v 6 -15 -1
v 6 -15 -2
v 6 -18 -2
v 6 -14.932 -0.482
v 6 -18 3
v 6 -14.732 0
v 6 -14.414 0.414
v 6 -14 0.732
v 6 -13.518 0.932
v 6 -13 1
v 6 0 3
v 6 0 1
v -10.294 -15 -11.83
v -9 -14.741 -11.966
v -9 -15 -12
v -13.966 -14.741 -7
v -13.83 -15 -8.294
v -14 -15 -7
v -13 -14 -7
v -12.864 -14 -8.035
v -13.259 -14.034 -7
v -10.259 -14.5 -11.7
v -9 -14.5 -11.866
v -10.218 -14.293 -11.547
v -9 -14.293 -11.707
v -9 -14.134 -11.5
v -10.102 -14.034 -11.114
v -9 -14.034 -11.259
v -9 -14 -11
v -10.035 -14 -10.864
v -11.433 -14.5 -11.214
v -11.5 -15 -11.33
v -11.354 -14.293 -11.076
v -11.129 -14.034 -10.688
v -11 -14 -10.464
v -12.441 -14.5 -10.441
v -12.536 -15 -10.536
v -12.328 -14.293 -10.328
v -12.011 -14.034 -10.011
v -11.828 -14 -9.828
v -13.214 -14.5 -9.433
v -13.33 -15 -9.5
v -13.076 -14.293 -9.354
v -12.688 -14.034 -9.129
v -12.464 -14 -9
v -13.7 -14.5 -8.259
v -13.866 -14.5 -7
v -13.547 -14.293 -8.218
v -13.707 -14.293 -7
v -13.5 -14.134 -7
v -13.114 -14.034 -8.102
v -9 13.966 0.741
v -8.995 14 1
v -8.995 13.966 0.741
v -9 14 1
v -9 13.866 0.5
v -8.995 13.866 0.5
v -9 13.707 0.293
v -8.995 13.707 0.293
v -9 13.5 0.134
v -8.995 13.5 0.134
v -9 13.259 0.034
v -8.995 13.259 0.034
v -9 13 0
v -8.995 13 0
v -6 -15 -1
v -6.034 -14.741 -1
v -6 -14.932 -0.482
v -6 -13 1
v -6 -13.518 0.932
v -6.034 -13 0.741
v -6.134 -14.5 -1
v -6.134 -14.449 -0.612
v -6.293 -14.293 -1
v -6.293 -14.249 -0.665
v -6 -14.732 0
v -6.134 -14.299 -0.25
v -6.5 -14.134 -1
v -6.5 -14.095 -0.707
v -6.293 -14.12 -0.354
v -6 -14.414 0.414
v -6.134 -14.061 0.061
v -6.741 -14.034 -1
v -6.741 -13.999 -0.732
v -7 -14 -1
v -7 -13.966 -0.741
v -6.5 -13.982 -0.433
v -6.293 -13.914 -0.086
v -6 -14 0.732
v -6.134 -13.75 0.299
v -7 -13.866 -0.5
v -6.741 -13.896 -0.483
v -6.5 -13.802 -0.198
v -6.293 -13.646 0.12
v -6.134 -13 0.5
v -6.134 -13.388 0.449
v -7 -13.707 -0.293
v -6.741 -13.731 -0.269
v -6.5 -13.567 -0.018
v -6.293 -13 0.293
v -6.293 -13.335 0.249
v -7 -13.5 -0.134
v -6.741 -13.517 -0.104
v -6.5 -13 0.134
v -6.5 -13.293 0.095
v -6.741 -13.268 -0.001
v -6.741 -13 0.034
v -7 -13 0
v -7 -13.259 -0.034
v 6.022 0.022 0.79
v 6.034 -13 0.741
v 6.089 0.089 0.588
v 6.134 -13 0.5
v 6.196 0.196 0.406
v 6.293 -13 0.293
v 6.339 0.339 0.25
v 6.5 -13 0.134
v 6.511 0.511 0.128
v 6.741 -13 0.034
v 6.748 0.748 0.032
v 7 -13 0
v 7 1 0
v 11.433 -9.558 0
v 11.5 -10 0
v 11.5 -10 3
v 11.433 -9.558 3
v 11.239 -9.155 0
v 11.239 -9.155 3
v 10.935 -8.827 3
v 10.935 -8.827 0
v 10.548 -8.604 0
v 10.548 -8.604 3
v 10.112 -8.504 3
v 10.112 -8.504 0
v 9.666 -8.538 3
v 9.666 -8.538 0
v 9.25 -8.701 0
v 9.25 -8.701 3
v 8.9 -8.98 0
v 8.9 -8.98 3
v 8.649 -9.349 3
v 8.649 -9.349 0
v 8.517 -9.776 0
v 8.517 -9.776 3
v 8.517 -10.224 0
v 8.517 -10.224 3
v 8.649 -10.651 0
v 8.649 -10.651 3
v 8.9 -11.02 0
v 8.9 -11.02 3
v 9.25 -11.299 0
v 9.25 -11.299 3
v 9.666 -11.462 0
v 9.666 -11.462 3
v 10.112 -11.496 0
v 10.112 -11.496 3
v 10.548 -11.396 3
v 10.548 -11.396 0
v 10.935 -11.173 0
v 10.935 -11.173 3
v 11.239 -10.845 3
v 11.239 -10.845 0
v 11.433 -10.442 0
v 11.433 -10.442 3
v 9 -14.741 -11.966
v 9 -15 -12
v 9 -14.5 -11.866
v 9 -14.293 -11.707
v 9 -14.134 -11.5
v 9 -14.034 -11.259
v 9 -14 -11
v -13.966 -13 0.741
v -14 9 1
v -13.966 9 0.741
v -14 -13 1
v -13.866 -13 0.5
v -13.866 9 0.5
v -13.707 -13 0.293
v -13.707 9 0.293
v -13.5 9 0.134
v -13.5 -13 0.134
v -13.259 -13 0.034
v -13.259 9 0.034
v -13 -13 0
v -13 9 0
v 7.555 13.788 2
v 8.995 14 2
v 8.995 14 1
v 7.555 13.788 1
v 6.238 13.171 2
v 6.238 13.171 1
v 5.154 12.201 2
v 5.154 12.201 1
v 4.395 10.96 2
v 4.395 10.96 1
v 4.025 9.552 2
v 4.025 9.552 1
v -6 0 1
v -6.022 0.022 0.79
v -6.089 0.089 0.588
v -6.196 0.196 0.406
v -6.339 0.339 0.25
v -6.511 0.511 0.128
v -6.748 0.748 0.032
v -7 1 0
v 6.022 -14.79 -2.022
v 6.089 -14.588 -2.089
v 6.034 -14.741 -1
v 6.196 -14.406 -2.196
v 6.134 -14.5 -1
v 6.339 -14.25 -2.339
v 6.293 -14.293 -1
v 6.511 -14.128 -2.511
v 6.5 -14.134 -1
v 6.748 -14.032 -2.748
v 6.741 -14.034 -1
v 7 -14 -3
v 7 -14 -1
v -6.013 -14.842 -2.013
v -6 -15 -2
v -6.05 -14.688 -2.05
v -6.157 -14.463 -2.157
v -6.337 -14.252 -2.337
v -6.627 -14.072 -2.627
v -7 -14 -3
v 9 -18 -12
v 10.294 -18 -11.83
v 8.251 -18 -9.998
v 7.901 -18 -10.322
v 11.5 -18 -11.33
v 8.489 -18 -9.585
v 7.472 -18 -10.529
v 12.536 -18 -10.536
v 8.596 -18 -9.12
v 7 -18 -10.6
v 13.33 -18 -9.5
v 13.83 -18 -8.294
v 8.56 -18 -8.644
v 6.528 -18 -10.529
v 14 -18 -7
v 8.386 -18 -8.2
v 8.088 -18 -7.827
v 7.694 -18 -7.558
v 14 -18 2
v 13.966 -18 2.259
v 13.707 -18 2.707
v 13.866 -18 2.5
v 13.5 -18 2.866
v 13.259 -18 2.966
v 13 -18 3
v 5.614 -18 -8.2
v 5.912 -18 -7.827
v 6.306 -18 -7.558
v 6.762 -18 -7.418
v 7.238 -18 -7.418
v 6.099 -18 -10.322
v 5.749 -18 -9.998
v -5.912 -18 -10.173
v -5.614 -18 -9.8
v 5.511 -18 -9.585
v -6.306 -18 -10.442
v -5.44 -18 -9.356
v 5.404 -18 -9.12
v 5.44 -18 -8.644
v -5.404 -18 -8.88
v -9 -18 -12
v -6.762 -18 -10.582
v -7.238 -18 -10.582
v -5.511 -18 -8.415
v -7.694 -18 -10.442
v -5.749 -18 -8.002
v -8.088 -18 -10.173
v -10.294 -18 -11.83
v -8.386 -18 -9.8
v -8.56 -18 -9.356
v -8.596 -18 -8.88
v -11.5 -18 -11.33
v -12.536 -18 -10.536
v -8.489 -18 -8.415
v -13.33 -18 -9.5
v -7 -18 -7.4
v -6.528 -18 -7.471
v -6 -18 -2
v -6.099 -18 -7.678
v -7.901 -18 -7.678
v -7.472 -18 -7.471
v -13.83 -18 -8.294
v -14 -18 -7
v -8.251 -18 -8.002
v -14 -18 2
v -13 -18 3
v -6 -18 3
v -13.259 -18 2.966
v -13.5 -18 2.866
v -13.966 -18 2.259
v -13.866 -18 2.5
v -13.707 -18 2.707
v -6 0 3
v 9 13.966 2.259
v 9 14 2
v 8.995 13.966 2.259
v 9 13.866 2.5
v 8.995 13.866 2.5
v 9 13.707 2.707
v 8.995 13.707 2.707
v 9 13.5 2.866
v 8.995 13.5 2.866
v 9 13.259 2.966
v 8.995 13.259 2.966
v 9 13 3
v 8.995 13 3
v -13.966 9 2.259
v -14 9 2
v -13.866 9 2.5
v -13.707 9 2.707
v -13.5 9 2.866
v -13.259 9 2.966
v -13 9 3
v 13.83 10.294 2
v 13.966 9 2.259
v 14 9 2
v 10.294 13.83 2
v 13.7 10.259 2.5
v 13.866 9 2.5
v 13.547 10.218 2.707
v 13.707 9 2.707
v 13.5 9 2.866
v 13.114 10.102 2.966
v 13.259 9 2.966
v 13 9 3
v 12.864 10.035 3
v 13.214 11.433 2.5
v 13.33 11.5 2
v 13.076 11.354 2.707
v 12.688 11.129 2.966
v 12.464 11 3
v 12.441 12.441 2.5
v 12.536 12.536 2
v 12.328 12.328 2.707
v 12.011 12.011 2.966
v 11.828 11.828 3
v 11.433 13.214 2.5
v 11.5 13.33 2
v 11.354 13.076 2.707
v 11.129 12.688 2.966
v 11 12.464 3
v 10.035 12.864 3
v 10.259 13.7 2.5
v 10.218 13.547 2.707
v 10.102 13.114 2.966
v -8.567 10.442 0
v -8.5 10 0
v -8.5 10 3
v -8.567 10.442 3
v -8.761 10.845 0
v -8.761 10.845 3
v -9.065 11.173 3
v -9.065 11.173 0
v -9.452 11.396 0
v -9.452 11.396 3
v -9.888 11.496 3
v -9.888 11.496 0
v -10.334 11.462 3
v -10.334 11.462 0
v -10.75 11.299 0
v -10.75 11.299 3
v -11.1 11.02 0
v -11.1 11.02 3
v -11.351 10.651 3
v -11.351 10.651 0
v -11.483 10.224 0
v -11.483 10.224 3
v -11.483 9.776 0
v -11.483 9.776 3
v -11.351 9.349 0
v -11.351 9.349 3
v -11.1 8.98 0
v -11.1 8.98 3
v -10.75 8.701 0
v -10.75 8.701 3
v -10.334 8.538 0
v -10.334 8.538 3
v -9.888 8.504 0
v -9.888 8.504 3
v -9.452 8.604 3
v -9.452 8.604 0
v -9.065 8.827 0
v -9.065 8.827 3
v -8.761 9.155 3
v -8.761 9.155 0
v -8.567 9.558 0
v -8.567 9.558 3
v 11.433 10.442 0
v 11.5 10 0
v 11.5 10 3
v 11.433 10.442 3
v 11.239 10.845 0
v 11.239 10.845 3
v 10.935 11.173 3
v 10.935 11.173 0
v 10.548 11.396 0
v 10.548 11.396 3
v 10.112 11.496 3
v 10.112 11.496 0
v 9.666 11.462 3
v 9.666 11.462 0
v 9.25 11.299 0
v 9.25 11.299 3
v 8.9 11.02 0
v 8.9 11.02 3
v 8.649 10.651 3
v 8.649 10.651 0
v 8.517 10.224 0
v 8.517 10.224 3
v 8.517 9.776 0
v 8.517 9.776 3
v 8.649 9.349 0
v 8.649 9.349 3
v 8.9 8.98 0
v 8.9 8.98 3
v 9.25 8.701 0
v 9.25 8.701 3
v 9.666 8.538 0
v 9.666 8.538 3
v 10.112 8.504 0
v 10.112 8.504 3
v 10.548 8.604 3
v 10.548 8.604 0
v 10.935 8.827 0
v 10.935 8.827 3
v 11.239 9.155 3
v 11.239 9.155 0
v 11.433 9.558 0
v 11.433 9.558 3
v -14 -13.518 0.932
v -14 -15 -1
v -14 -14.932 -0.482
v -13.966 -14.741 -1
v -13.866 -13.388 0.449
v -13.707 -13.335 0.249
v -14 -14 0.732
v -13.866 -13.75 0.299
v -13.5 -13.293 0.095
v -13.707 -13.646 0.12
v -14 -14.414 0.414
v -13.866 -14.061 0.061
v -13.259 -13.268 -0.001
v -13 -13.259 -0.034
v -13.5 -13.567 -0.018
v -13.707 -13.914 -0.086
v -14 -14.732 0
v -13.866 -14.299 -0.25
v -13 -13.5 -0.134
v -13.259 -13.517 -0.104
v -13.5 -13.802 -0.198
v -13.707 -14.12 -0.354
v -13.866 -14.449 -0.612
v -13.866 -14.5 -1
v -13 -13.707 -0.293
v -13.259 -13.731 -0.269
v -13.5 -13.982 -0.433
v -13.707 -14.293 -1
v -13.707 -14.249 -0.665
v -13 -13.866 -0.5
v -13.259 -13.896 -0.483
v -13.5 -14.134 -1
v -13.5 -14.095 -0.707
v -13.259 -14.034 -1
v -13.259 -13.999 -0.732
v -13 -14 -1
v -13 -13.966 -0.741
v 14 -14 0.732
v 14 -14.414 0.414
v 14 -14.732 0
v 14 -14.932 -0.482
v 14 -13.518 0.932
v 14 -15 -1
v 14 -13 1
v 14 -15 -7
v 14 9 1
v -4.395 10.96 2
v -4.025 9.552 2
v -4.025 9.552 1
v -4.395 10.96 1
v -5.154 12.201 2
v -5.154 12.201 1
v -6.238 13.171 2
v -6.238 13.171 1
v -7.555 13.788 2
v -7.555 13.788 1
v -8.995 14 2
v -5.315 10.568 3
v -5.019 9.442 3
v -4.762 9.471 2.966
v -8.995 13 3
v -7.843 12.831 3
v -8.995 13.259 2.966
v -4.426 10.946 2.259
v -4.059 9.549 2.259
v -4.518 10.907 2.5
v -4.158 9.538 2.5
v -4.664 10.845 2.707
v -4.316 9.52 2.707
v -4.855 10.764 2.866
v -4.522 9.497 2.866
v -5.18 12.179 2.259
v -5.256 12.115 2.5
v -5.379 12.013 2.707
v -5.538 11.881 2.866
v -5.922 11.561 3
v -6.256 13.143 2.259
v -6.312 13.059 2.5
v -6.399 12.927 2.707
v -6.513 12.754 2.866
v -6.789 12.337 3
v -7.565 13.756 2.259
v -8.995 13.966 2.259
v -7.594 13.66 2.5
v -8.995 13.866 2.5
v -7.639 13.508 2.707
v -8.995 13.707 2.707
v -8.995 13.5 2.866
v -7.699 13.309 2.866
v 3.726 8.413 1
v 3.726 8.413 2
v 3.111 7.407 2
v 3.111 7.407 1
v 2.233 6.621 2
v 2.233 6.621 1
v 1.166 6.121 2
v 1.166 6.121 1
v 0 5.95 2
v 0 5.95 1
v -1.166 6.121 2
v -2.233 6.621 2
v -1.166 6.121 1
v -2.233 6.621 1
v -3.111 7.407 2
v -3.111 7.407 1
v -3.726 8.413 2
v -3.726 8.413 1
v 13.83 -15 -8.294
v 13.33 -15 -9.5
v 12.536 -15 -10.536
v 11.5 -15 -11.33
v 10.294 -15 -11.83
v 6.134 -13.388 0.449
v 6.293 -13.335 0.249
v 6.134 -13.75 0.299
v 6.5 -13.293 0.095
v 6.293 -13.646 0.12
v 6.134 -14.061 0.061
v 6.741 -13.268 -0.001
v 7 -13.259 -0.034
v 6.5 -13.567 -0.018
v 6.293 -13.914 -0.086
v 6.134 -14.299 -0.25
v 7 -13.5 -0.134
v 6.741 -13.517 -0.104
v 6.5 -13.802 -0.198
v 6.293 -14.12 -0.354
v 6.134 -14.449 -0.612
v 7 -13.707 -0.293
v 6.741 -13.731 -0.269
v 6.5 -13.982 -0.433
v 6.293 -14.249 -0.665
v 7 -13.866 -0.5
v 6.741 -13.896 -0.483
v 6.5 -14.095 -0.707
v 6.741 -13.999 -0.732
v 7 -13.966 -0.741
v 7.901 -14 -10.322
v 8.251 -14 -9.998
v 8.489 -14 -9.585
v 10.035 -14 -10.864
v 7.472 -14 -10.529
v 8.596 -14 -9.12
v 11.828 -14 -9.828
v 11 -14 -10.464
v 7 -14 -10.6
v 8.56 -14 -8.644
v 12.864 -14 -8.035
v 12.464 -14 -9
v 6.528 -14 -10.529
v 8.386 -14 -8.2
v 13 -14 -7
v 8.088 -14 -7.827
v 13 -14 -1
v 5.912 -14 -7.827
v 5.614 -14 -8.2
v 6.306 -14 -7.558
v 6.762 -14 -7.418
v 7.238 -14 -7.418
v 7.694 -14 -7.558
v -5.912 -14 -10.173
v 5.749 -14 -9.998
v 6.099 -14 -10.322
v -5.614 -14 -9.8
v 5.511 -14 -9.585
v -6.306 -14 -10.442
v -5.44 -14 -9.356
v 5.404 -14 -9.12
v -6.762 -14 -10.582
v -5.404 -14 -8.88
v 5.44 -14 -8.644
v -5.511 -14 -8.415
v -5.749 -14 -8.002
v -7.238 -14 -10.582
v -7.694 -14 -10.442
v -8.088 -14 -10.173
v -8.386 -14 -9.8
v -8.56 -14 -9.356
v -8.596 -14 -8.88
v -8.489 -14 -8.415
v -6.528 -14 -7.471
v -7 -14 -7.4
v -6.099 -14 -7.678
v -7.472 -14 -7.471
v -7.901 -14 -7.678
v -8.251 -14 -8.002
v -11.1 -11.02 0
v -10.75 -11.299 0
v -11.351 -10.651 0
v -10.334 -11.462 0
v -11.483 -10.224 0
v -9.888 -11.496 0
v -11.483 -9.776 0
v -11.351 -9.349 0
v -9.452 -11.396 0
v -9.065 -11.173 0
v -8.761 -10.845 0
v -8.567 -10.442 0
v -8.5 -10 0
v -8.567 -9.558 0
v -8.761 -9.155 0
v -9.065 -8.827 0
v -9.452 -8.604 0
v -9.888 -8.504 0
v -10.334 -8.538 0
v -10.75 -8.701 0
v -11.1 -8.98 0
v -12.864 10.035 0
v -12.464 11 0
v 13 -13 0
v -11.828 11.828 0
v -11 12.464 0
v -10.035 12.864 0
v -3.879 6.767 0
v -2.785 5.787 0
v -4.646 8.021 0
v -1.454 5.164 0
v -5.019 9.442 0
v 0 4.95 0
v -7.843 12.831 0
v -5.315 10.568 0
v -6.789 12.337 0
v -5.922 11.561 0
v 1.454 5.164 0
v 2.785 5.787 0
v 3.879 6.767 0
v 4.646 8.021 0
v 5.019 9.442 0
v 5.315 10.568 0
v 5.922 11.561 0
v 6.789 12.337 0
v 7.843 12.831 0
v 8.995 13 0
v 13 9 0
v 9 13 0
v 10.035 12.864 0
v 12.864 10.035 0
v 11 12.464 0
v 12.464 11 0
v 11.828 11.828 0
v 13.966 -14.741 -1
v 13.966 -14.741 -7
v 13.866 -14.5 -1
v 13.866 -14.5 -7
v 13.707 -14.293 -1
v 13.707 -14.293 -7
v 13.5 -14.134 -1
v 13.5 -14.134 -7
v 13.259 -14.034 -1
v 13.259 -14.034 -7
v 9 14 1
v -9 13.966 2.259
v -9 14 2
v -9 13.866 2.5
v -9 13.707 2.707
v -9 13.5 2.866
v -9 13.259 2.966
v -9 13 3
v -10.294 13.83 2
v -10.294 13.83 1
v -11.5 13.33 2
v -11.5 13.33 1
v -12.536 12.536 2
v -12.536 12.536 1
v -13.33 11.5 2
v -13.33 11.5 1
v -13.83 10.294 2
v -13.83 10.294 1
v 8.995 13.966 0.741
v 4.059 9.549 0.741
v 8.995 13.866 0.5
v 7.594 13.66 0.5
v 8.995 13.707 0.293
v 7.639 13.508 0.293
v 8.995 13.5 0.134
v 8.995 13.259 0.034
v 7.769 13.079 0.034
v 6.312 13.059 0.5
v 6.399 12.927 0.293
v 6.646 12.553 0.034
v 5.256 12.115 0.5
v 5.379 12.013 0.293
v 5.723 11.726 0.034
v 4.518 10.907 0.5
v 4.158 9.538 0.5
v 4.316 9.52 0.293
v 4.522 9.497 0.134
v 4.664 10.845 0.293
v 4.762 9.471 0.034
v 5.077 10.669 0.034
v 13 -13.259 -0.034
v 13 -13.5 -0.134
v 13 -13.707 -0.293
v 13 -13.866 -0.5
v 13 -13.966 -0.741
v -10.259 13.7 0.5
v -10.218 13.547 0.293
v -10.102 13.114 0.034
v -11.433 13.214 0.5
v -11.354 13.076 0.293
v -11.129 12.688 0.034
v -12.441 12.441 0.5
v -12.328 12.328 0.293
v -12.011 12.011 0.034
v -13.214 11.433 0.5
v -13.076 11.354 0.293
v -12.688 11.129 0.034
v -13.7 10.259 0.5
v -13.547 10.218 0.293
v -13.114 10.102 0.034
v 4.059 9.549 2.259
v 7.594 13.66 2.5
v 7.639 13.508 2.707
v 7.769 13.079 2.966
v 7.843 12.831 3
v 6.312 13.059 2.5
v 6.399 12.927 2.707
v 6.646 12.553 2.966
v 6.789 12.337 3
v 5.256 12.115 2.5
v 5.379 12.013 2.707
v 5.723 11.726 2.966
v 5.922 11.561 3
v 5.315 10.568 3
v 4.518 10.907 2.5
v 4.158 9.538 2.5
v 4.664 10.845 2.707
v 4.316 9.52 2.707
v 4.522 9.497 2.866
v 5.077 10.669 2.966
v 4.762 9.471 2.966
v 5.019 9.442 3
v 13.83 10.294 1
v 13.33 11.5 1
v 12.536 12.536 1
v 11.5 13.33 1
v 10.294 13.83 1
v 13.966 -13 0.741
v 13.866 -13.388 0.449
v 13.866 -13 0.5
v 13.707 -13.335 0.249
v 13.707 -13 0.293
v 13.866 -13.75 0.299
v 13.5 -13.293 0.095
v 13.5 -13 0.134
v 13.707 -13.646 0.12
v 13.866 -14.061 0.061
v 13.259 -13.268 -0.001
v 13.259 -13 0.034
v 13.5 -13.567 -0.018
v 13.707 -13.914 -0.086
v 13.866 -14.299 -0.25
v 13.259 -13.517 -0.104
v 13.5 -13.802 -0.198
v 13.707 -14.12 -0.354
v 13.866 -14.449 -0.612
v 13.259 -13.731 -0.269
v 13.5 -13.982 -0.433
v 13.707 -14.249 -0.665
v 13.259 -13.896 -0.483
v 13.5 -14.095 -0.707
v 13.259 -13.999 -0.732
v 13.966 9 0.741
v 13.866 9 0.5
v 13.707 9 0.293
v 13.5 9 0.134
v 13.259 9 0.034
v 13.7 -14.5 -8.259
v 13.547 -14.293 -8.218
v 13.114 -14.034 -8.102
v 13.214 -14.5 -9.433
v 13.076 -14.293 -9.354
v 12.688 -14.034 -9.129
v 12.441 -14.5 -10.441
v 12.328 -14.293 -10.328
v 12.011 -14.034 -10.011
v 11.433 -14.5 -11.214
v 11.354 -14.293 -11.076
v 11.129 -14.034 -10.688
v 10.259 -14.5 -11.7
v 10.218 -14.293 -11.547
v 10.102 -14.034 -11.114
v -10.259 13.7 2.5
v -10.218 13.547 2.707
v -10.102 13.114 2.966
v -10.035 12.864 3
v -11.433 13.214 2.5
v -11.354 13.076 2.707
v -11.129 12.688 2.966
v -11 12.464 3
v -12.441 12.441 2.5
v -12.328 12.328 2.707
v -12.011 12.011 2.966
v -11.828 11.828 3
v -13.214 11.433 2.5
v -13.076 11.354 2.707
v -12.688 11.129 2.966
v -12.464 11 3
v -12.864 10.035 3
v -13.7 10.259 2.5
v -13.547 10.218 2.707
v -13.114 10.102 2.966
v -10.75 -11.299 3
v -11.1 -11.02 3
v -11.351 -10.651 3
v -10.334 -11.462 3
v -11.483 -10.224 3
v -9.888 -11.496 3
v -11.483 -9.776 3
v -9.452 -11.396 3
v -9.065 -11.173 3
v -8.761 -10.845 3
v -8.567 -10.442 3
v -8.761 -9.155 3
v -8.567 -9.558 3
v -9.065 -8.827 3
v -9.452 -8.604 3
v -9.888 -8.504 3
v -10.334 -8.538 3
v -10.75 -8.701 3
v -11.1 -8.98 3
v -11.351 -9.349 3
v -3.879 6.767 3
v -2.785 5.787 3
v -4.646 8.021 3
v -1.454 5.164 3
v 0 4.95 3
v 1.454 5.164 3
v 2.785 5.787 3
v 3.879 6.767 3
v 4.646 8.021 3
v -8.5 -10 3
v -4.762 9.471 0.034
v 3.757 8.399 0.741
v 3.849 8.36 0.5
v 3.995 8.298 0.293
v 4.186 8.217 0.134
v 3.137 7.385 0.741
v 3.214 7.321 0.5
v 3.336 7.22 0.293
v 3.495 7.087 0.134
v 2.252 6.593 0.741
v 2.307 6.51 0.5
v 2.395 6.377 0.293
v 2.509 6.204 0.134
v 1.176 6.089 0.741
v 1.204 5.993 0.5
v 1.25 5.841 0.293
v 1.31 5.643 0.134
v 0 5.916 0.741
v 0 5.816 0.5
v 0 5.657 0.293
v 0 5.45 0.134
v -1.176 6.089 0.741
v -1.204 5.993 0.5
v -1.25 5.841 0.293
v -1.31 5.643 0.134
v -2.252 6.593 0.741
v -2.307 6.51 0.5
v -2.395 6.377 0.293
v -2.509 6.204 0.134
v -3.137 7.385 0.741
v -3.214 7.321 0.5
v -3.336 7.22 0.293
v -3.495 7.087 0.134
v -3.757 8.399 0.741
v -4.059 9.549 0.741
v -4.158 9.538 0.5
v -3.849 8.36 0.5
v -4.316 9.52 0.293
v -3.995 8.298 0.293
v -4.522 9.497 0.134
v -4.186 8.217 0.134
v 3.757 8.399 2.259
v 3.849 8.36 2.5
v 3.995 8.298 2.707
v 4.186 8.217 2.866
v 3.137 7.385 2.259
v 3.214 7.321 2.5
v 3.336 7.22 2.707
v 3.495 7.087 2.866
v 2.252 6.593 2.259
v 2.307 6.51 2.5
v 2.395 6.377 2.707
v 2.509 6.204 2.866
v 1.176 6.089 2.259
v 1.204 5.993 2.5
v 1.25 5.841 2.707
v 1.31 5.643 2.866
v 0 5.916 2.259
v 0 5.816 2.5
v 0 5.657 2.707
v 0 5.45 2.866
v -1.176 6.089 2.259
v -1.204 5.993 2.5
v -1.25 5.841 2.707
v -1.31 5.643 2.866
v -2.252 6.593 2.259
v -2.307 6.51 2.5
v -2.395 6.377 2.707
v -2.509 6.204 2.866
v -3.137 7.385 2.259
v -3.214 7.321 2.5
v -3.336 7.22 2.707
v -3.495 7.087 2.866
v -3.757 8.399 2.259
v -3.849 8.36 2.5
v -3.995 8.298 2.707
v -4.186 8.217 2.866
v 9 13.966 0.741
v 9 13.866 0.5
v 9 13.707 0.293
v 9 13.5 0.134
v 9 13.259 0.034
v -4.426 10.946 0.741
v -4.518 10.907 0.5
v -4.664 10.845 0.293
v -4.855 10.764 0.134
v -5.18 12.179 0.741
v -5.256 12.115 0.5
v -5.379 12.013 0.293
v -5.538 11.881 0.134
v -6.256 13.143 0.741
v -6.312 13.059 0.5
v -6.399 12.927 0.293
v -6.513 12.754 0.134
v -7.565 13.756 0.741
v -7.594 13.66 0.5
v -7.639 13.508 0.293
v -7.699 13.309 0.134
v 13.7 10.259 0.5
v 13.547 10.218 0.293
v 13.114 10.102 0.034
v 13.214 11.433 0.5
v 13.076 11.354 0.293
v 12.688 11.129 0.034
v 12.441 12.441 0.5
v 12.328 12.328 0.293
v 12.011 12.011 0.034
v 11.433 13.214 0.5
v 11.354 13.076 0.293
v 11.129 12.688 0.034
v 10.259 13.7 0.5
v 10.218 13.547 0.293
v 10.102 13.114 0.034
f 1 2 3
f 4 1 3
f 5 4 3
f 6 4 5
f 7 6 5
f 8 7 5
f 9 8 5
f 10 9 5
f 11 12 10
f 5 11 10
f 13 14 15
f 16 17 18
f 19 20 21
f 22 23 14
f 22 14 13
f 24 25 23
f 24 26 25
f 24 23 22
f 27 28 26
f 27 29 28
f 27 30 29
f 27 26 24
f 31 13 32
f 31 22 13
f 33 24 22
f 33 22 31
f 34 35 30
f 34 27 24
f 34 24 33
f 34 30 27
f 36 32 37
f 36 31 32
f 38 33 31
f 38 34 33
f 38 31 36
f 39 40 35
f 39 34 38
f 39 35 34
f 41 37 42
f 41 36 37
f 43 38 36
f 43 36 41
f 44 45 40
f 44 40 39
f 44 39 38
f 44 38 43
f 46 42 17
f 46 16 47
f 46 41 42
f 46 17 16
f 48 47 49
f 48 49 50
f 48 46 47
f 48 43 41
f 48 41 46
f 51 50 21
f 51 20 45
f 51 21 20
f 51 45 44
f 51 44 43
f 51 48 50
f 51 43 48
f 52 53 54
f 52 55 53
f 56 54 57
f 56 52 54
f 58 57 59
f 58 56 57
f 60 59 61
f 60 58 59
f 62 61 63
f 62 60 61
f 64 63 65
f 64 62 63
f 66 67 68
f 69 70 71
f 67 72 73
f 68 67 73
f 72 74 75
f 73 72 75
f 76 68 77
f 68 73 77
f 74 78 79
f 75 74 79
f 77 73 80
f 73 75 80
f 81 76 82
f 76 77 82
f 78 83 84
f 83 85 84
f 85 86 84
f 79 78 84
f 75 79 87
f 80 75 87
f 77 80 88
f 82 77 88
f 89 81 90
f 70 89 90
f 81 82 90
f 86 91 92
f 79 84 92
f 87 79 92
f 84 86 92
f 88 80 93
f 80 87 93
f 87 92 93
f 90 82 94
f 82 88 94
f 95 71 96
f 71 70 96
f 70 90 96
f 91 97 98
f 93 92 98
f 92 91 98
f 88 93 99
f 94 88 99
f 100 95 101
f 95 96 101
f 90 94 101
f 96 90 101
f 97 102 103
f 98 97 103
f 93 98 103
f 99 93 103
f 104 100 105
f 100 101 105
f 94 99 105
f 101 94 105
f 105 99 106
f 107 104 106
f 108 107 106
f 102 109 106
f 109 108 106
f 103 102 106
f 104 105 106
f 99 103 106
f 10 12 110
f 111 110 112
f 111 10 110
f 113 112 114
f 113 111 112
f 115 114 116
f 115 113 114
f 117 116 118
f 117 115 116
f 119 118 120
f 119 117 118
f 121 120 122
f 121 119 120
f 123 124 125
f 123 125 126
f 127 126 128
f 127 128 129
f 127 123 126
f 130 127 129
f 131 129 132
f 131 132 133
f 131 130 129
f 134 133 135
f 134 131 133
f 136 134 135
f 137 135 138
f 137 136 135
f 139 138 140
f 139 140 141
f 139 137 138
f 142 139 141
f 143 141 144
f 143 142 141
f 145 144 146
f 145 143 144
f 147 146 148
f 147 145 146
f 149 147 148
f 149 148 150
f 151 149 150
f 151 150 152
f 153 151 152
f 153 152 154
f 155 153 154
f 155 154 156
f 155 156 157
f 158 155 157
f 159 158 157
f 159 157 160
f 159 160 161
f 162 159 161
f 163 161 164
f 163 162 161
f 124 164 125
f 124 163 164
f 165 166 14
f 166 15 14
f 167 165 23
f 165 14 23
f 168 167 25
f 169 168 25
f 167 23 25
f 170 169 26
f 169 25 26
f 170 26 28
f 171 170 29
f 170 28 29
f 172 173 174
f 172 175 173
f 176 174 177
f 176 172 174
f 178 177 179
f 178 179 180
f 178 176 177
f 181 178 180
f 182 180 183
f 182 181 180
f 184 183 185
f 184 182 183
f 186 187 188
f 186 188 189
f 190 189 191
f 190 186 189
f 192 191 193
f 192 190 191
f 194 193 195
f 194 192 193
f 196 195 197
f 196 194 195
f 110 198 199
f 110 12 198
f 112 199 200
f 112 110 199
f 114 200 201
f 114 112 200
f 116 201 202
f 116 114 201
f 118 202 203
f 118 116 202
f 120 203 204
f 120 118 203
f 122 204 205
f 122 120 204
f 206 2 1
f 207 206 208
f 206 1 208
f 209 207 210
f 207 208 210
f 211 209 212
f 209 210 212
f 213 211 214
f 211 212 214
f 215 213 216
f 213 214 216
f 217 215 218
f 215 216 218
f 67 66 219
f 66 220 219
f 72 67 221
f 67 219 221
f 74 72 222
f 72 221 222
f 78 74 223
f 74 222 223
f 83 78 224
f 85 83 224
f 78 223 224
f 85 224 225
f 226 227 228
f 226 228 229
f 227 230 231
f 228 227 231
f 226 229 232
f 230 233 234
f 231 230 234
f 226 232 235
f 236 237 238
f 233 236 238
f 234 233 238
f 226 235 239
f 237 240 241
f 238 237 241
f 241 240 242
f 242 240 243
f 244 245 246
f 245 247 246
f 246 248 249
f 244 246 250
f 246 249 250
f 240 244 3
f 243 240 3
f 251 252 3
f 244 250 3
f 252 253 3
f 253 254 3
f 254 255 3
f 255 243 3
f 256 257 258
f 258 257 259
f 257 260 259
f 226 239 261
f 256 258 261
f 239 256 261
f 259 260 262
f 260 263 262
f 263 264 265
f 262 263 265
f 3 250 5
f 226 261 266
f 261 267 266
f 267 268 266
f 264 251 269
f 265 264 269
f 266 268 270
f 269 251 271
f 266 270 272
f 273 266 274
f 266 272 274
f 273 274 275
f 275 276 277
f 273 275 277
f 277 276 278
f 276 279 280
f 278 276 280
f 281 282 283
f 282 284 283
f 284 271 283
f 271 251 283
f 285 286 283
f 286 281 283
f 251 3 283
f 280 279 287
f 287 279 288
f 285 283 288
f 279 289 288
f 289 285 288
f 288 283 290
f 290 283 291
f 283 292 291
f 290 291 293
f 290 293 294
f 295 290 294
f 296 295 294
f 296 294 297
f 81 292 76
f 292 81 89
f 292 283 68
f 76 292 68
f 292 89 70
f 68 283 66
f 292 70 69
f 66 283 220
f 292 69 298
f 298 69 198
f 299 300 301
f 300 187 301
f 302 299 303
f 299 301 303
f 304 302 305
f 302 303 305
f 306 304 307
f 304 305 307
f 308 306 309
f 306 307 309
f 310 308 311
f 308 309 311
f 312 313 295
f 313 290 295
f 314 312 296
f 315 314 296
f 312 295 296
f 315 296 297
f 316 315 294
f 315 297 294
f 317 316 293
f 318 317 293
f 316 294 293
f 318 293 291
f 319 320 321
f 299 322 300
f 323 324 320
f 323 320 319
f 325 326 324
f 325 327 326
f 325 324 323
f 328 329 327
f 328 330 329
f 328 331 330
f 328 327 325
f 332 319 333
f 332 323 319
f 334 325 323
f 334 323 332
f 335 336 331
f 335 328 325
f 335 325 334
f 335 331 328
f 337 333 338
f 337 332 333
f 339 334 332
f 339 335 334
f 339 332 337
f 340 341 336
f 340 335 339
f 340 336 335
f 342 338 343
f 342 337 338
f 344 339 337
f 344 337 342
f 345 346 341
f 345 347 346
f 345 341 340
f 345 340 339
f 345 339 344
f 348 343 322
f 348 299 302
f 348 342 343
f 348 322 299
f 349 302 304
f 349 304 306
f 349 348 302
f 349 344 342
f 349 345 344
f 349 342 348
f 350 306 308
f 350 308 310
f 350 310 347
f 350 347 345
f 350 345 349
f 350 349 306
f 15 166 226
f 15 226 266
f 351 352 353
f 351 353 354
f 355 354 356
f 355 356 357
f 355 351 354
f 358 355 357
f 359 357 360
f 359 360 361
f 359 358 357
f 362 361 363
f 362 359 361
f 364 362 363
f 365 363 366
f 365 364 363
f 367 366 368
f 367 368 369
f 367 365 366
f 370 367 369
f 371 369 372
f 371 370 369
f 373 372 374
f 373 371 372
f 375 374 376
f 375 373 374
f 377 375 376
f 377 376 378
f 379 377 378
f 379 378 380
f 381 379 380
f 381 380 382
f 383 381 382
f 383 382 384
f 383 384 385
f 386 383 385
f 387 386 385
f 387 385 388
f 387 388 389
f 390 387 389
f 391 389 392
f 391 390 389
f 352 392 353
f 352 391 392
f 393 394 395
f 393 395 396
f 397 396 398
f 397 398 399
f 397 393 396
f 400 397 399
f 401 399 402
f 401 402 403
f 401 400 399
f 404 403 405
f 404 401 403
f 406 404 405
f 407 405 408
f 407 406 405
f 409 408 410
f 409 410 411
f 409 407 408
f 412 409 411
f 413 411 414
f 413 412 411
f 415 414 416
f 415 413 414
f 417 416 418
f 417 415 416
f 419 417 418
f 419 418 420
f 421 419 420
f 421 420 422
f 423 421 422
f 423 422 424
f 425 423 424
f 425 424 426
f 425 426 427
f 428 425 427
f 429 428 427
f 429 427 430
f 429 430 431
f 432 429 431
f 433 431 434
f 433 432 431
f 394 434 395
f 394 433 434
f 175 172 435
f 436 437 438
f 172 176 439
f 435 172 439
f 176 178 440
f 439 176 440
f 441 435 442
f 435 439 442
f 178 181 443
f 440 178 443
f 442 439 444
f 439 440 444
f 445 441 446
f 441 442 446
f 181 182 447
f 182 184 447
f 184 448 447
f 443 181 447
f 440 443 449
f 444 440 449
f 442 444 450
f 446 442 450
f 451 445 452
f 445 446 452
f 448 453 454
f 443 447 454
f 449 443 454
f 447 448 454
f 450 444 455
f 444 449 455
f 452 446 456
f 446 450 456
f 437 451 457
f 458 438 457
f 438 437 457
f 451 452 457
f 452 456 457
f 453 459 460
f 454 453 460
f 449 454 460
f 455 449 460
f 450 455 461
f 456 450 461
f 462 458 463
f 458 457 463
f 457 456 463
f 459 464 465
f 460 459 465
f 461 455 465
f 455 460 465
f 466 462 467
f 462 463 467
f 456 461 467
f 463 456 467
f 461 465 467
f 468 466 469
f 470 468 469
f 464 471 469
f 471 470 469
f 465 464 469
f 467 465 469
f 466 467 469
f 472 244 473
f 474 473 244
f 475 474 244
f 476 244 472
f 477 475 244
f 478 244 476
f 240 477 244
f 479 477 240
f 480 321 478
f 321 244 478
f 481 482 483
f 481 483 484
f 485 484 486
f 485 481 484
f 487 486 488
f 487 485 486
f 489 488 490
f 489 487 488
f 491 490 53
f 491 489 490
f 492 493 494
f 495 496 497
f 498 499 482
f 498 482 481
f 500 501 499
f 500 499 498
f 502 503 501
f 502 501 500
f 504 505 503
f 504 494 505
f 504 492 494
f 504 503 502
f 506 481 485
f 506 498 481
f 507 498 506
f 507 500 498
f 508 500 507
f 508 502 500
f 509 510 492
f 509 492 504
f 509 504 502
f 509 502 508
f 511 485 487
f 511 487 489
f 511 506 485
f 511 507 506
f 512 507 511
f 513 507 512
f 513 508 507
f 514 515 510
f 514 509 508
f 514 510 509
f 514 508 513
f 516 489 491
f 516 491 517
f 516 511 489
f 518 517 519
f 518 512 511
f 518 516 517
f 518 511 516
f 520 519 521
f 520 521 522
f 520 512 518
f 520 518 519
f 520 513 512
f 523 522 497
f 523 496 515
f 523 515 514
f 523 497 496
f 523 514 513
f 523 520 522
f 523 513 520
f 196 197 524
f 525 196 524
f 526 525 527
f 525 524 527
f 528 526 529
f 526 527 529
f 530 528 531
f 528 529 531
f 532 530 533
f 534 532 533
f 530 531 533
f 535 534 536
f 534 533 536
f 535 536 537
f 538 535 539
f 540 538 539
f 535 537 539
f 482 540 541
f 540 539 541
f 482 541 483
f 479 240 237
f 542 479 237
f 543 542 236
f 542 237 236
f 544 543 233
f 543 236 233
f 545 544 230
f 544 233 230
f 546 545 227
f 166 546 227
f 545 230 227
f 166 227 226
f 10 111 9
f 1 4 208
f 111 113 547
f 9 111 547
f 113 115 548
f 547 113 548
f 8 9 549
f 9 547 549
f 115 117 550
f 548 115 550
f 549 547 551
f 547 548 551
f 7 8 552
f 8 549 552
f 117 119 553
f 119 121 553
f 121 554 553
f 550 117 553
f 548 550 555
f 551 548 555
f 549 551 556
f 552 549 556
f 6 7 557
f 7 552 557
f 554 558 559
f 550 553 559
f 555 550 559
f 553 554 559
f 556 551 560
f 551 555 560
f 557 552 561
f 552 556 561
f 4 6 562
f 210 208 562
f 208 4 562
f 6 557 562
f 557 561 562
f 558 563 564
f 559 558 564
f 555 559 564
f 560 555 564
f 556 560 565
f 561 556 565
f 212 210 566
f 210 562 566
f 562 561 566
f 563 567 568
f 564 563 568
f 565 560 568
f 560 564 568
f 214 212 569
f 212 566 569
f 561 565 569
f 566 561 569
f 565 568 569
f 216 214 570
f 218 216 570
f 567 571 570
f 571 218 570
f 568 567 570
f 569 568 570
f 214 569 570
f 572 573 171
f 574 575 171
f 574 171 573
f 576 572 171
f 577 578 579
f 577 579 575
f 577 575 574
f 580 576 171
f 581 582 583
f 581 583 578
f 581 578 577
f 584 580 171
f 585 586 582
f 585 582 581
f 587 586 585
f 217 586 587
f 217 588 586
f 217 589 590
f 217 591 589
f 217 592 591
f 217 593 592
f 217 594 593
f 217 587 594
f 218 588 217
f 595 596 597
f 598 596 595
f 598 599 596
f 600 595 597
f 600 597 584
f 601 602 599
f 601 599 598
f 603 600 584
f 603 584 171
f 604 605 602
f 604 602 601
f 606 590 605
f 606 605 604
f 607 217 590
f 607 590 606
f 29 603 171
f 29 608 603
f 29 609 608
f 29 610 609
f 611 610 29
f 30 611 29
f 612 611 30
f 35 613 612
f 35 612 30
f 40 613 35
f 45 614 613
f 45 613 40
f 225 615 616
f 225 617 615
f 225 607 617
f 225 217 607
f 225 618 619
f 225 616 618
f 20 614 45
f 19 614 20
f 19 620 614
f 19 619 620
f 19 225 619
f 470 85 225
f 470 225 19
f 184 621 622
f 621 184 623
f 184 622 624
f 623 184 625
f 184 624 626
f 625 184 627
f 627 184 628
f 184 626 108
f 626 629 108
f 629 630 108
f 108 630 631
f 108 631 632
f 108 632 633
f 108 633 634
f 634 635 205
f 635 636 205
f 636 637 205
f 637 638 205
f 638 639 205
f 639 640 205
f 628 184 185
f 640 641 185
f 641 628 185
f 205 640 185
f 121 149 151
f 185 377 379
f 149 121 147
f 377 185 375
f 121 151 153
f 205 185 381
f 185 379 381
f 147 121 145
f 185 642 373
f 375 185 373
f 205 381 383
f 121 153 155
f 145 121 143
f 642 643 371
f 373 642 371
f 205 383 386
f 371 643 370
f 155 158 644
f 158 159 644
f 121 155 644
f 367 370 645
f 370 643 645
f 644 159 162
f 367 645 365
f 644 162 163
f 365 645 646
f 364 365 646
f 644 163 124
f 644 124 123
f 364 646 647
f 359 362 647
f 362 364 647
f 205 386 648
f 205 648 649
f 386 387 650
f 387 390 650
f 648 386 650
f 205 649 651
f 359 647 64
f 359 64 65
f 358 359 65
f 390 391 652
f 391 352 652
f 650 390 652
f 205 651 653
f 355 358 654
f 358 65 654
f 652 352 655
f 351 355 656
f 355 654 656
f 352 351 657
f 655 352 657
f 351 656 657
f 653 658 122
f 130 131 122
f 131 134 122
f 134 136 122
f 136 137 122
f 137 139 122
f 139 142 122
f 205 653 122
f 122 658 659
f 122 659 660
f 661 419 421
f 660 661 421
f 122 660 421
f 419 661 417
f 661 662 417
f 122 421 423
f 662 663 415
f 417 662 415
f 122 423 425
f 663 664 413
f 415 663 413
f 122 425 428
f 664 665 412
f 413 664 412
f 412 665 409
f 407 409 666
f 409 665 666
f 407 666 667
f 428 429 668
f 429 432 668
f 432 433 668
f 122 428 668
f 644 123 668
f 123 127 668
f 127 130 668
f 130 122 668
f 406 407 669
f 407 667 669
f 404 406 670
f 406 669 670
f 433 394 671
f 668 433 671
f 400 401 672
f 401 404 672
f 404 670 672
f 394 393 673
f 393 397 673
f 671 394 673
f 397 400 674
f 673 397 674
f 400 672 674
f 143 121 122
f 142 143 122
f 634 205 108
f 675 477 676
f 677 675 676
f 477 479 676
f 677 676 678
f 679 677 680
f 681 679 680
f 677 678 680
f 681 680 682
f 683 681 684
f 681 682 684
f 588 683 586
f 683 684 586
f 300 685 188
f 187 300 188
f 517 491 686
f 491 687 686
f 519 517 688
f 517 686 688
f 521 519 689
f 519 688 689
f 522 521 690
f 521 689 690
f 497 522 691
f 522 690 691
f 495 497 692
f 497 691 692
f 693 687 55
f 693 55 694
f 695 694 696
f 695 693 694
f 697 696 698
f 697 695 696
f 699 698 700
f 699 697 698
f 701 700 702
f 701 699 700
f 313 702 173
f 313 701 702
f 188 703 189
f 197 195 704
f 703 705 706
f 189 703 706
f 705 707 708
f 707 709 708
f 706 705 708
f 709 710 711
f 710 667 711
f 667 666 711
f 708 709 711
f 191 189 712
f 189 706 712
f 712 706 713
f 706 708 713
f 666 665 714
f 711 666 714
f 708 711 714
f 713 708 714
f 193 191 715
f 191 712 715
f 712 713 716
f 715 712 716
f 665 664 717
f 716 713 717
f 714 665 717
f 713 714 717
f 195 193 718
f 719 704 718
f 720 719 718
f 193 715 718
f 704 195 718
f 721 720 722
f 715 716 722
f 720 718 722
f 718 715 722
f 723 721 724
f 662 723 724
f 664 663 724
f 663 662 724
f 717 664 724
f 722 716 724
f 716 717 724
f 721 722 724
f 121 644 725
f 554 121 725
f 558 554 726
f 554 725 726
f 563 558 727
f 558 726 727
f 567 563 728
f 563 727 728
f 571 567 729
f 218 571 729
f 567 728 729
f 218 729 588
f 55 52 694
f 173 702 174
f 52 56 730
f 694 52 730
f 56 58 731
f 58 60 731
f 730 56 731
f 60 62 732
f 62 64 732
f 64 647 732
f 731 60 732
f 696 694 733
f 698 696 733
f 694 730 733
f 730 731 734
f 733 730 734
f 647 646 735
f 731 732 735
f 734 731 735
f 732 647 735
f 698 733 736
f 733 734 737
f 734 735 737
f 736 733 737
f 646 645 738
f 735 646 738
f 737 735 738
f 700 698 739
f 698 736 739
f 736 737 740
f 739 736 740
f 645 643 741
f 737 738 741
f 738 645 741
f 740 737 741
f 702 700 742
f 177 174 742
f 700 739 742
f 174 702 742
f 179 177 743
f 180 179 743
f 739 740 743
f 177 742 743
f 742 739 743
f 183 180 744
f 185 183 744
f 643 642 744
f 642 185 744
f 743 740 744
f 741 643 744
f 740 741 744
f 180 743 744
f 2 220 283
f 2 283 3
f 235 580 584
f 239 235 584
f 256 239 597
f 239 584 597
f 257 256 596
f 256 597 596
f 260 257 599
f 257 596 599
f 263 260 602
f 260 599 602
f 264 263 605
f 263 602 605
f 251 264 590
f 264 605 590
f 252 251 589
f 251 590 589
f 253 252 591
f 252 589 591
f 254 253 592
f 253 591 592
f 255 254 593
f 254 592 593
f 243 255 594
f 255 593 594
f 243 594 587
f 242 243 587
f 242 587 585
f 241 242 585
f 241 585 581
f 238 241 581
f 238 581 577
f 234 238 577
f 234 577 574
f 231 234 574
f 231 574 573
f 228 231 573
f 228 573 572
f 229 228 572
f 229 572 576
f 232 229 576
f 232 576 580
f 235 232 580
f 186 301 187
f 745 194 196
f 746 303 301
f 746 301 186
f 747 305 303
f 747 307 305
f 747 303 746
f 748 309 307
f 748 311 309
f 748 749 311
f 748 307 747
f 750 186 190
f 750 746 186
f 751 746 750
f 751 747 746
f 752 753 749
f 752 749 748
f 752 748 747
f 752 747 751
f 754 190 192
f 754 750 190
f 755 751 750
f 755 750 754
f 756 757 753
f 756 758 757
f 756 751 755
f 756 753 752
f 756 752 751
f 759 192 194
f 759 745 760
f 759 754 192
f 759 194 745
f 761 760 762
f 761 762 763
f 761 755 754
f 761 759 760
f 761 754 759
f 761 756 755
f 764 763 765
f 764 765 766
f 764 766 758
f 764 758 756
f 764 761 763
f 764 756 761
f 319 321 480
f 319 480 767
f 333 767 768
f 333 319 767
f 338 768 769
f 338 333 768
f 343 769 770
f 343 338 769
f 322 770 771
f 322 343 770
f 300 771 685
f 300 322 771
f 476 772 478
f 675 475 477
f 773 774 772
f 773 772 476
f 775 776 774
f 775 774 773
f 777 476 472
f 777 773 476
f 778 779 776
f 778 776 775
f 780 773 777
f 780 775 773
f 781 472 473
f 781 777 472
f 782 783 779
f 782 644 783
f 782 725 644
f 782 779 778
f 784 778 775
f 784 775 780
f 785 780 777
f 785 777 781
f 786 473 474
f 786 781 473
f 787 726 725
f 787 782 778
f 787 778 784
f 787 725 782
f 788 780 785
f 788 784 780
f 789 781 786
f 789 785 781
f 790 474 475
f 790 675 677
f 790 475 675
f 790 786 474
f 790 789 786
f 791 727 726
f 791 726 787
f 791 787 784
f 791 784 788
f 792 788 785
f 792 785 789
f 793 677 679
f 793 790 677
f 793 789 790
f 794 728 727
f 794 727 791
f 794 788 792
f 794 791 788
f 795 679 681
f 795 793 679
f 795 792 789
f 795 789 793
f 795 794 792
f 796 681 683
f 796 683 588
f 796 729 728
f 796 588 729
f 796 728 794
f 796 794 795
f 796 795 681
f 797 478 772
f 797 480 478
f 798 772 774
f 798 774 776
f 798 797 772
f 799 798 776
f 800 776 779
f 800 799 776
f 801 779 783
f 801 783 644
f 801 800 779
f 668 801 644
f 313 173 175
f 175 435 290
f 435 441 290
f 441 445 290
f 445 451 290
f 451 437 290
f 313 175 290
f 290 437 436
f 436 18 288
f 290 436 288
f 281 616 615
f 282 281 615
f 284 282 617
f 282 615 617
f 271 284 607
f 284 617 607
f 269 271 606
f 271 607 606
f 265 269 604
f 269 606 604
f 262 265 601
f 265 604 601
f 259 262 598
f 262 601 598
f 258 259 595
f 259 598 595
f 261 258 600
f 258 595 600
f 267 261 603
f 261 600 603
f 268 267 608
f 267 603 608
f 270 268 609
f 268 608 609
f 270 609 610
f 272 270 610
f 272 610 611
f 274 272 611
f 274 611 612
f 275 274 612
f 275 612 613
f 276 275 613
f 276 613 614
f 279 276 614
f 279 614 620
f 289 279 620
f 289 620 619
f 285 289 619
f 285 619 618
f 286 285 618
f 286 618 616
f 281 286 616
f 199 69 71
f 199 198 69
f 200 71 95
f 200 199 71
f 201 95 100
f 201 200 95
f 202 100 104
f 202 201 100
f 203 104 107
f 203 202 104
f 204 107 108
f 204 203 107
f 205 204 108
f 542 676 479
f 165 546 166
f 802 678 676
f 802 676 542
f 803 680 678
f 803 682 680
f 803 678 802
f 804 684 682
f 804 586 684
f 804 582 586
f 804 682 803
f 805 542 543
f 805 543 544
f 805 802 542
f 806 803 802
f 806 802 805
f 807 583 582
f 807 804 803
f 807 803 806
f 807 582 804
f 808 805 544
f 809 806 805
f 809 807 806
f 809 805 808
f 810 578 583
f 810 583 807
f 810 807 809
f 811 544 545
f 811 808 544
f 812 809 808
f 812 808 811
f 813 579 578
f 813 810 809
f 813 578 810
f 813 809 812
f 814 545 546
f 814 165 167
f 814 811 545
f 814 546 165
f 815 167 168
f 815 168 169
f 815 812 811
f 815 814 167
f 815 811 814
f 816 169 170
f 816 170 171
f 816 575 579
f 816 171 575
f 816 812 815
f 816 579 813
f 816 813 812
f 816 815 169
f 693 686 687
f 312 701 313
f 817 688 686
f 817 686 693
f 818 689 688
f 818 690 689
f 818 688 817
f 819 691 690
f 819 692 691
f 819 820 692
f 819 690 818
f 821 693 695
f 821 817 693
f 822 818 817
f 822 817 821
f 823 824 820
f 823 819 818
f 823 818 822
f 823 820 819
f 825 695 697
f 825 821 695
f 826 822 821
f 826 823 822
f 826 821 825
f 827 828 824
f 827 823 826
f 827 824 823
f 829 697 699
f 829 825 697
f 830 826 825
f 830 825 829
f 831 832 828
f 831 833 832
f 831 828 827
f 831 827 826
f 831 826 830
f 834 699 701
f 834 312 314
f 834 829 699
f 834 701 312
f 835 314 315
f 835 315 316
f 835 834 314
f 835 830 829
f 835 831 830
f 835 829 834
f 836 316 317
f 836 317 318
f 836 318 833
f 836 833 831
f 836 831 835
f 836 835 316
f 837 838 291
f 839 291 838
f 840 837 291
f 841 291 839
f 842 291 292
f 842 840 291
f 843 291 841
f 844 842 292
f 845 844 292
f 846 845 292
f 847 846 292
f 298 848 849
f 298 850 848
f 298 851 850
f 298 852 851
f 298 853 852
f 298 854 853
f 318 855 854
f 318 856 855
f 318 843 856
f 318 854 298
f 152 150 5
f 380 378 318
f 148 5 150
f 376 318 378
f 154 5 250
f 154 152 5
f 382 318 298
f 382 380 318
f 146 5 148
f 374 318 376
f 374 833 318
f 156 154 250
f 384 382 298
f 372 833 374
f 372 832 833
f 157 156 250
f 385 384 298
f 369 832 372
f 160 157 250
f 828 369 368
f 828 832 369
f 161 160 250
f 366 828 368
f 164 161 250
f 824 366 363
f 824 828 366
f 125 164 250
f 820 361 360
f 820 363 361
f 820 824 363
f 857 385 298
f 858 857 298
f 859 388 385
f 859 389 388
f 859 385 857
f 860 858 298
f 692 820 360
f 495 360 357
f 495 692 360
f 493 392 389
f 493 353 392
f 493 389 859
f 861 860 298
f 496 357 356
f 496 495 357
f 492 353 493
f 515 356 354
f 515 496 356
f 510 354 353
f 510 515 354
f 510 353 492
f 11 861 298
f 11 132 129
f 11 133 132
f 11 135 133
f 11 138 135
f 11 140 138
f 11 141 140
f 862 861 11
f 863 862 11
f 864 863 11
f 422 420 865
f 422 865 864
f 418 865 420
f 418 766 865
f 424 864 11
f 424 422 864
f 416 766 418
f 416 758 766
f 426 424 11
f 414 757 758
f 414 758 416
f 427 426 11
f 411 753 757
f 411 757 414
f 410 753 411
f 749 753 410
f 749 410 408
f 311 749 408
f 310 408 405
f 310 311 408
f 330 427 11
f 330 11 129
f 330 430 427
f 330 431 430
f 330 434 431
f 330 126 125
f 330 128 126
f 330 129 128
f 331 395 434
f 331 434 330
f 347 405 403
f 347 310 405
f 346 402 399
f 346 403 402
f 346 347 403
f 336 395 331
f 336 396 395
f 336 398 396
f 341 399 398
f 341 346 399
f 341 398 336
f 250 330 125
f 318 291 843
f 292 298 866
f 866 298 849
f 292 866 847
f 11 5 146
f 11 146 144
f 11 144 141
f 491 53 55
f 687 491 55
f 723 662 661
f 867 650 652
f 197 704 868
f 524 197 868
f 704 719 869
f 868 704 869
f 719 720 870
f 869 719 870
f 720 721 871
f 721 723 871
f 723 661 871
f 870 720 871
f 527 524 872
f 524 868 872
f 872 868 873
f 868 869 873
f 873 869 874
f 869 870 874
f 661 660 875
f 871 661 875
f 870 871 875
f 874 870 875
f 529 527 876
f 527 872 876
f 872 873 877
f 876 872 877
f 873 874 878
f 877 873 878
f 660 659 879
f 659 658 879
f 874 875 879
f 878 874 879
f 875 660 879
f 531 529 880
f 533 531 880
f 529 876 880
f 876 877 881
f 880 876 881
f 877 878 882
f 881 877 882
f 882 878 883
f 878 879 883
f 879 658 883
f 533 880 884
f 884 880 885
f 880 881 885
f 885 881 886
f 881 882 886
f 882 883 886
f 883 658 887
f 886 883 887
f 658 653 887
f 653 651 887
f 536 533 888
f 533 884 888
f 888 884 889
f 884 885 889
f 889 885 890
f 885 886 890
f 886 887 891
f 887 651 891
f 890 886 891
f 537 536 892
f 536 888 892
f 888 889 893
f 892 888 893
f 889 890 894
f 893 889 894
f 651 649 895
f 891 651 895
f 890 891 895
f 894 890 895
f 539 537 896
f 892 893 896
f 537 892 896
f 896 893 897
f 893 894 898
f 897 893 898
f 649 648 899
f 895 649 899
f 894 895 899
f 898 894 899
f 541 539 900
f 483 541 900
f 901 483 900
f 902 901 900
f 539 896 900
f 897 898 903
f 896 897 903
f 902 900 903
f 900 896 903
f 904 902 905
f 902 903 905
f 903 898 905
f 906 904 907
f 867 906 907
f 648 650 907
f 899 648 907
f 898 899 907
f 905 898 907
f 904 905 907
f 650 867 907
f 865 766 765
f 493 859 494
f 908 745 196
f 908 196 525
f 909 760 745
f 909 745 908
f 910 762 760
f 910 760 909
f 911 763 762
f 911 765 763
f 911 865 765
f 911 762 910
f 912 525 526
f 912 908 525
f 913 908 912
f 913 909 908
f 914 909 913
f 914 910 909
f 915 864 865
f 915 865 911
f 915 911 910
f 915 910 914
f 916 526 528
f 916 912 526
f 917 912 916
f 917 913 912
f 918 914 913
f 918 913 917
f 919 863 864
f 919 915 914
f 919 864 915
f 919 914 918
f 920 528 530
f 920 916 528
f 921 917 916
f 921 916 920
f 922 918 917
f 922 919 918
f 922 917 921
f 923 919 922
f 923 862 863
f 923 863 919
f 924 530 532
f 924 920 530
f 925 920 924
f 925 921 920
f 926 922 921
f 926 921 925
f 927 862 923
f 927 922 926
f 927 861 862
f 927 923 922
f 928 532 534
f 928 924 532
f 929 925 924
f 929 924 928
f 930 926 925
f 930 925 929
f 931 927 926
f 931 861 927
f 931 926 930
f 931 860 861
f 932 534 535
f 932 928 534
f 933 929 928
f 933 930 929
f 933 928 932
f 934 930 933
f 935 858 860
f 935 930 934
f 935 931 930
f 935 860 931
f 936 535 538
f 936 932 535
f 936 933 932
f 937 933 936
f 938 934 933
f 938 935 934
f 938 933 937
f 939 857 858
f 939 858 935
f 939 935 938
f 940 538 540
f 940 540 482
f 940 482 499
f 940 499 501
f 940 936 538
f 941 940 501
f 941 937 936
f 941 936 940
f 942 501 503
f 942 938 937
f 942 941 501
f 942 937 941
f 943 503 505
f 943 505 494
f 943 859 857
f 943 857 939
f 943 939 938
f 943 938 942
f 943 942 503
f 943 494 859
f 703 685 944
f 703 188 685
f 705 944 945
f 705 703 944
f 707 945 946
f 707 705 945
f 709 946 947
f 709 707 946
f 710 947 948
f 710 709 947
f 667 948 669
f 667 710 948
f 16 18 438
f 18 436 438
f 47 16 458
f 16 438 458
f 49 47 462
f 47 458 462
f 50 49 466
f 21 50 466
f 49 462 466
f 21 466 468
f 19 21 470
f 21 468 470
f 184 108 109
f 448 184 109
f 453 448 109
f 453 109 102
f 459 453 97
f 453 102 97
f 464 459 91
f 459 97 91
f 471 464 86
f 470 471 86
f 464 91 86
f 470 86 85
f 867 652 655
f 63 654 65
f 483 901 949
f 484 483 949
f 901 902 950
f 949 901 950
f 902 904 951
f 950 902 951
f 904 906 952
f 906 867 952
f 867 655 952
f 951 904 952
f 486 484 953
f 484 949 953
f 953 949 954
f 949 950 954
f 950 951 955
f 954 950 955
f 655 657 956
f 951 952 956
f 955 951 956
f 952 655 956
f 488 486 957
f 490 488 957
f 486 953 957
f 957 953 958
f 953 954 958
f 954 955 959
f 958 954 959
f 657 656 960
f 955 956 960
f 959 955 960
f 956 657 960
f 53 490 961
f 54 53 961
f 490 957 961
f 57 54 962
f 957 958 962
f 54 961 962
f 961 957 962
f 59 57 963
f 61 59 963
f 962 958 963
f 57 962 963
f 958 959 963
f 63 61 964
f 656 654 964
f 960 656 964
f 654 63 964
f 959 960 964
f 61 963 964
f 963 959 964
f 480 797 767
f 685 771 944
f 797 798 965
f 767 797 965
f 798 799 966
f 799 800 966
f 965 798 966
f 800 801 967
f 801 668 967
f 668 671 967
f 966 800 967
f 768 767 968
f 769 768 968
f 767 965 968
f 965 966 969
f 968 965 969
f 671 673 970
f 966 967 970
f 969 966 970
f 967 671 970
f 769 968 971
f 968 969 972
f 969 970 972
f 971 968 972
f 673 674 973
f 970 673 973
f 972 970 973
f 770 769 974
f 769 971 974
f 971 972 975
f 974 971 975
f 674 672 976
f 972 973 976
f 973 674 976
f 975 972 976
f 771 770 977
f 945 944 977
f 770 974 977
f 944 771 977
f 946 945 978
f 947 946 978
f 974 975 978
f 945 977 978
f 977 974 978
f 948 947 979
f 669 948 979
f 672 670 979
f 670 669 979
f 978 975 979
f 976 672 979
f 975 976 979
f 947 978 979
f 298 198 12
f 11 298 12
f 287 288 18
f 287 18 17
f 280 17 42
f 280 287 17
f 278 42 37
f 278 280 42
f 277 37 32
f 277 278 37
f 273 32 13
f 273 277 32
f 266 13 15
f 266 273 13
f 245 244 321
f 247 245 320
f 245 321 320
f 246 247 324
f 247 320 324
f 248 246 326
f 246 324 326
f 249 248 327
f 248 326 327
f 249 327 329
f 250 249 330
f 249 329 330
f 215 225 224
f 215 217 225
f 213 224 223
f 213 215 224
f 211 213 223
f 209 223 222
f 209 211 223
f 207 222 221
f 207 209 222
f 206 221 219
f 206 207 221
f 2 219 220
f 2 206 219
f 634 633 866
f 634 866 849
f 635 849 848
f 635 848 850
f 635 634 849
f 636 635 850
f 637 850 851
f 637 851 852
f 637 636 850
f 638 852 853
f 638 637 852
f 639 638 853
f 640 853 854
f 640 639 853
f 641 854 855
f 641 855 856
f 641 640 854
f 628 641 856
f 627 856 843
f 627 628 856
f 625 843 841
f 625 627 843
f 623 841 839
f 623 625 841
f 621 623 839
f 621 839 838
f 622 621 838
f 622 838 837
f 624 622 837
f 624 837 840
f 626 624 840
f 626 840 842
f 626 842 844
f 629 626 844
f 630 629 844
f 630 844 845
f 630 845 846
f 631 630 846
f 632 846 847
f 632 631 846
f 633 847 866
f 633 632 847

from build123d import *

# Parameters (mm, degrees)
SKETCH_1_R          = 1.5
EXTRUDE_2_DEPTH     = 3
EXTRUDE_3_DEPTH     = 4
SKETCH_3_R          = 1.6
CUT_EXTRUDE_1_DEPTH = 5
FILLET_1_R          = 5
FILLET_2_R          = 1
FILLET_3_R          = 1


with BuildPart() as part:
    # 草图1 → 凸台-拉伸2 (new body)
    with BuildSketch(Plane.XY):
        with BuildLine():
            Line((6, -14), (14, -14))
            Line((14, -14), (14, 14))
            Line((14, 14), (0.634428877, 14))
            ThreePointArc((0.634428877, 14), (0, 5.95), (-0.634428877, 14))
            Line((-0.634428877, 14), (-14, 14))
            Line((-14, 14), (-14, -14))
            Line((-14, -14), (-6, -14))
            Line((-6, -14), (-6, 0))
            Line((-6, 0), (6, 0))
            Line((6, 0), (6, -14))
        make_face()
        with Locations((-10, 10)):
            Circle(SKETCH_1_R, mode=Mode.SUBTRACT)
        with Locations((10, 10)):
            Circle(SKETCH_1_R, mode=Mode.SUBTRACT)
        with Locations((10, -10)):
            Circle(SKETCH_1_R, mode=Mode.SUBTRACT)
        with Locations((-10, -10)):
            Circle(SKETCH_1_R, mode=Mode.SUBTRACT)
    extrude(amount=EXTRUDE_2_DEPTH)

    # 草图2 → 凸台-拉伸3 (add)
    with BuildSketch(Plane.XZ.offset(14)):
        Polygon((6, 3), (14, 3), (14, -12), (-14, -12), (-14, 3), (-6, 3), (-6, -2), (6, -2), align=None)
    extrude(amount=EXTRUDE_3_DEPTH)

    # 草图3 → 切除-拉伸1 (cut)
    with BuildSketch(Plane(origin=(0, -14, 0), x_dir=(1, 0, 0), z_dir=(0, 1, 0))):
        with Locations(Location((-7, 9, 0), (0, 0, 270))):
            Circle(SKETCH_3_R)
        with Locations(Location((7, 9, 0), (0, 0, 90))):
            Circle(SKETCH_3_R)
    extrude(amount=-CUT_EXTRUDE_1_DEPTH, mode=Mode.SUBTRACT)

    # 圆角1
    fillet_1_edges = [part.edges().sort_by_distance(p)[0] for p in [
        (-14, 14, 1.5),
        (-0.634428877, 14, 1.5),
        (0.634428877, 14, 1.5),
        (14, 14, 1.5),
        (-14, -16, -12),
        (14, -16, -12),
    ]]
    fillet(fillet_1_edges, radius=FILLET_1_R)

    # 圆角2
    fillet_2_edges = [part.edges().sort_by_distance(p)[0] for p in [
        (0, 0, 0),
        (-6, -7, 0),
        (-10, -14, 0),
        (14, -2.5, 0),
        (-14, -14, -3.5),
        (6, -14, -1),
        (0, -14, -2),
        (-6, -14, -1),
        (-8.997290851, 14, 0),
        (-14, -2.5, 0),
        (0, 5.95, 0),
        (8.997290851, 14, 0),
        (12.535533906, 12.535533906, 0),
        (-12.535533906, 12.535533906, 0),
        (5.660097555, 12.725750323, 0),
        (-5.660097555, 12.725750323, 0),
        (10, -14, 0),
        (14, -14, -3.5),
        (0, -14, -12),
        (6, -7, 0),
        (12.535533906, -14, -10.535533906),
        (-12.535533906, -14, -10.535533906),
    ]]
    fillet(fillet_2_edges, radius=FILLET_2_R)

    # 圆角3
    fillet_3_edges = [part.edges().sort_by_distance(p)[0] for p in [
        (14, -4.5, 3),
        (-8.997290851, 14, 3),
        (0, 5.95, 3),
        (8.997290851, 14, 3),
        (-14, -4.5, 3),
        (12.535533906, 12.535533906, 3),
        (-12.535533906, 12.535533906, 3),
        (5.660097555, 12.725750323, 3),
        (-5.660097555, 12.725750323, 3),
    ]]
    fillet(fillet_3_edges, radius=FILLET_3_R)


solid = part.part
